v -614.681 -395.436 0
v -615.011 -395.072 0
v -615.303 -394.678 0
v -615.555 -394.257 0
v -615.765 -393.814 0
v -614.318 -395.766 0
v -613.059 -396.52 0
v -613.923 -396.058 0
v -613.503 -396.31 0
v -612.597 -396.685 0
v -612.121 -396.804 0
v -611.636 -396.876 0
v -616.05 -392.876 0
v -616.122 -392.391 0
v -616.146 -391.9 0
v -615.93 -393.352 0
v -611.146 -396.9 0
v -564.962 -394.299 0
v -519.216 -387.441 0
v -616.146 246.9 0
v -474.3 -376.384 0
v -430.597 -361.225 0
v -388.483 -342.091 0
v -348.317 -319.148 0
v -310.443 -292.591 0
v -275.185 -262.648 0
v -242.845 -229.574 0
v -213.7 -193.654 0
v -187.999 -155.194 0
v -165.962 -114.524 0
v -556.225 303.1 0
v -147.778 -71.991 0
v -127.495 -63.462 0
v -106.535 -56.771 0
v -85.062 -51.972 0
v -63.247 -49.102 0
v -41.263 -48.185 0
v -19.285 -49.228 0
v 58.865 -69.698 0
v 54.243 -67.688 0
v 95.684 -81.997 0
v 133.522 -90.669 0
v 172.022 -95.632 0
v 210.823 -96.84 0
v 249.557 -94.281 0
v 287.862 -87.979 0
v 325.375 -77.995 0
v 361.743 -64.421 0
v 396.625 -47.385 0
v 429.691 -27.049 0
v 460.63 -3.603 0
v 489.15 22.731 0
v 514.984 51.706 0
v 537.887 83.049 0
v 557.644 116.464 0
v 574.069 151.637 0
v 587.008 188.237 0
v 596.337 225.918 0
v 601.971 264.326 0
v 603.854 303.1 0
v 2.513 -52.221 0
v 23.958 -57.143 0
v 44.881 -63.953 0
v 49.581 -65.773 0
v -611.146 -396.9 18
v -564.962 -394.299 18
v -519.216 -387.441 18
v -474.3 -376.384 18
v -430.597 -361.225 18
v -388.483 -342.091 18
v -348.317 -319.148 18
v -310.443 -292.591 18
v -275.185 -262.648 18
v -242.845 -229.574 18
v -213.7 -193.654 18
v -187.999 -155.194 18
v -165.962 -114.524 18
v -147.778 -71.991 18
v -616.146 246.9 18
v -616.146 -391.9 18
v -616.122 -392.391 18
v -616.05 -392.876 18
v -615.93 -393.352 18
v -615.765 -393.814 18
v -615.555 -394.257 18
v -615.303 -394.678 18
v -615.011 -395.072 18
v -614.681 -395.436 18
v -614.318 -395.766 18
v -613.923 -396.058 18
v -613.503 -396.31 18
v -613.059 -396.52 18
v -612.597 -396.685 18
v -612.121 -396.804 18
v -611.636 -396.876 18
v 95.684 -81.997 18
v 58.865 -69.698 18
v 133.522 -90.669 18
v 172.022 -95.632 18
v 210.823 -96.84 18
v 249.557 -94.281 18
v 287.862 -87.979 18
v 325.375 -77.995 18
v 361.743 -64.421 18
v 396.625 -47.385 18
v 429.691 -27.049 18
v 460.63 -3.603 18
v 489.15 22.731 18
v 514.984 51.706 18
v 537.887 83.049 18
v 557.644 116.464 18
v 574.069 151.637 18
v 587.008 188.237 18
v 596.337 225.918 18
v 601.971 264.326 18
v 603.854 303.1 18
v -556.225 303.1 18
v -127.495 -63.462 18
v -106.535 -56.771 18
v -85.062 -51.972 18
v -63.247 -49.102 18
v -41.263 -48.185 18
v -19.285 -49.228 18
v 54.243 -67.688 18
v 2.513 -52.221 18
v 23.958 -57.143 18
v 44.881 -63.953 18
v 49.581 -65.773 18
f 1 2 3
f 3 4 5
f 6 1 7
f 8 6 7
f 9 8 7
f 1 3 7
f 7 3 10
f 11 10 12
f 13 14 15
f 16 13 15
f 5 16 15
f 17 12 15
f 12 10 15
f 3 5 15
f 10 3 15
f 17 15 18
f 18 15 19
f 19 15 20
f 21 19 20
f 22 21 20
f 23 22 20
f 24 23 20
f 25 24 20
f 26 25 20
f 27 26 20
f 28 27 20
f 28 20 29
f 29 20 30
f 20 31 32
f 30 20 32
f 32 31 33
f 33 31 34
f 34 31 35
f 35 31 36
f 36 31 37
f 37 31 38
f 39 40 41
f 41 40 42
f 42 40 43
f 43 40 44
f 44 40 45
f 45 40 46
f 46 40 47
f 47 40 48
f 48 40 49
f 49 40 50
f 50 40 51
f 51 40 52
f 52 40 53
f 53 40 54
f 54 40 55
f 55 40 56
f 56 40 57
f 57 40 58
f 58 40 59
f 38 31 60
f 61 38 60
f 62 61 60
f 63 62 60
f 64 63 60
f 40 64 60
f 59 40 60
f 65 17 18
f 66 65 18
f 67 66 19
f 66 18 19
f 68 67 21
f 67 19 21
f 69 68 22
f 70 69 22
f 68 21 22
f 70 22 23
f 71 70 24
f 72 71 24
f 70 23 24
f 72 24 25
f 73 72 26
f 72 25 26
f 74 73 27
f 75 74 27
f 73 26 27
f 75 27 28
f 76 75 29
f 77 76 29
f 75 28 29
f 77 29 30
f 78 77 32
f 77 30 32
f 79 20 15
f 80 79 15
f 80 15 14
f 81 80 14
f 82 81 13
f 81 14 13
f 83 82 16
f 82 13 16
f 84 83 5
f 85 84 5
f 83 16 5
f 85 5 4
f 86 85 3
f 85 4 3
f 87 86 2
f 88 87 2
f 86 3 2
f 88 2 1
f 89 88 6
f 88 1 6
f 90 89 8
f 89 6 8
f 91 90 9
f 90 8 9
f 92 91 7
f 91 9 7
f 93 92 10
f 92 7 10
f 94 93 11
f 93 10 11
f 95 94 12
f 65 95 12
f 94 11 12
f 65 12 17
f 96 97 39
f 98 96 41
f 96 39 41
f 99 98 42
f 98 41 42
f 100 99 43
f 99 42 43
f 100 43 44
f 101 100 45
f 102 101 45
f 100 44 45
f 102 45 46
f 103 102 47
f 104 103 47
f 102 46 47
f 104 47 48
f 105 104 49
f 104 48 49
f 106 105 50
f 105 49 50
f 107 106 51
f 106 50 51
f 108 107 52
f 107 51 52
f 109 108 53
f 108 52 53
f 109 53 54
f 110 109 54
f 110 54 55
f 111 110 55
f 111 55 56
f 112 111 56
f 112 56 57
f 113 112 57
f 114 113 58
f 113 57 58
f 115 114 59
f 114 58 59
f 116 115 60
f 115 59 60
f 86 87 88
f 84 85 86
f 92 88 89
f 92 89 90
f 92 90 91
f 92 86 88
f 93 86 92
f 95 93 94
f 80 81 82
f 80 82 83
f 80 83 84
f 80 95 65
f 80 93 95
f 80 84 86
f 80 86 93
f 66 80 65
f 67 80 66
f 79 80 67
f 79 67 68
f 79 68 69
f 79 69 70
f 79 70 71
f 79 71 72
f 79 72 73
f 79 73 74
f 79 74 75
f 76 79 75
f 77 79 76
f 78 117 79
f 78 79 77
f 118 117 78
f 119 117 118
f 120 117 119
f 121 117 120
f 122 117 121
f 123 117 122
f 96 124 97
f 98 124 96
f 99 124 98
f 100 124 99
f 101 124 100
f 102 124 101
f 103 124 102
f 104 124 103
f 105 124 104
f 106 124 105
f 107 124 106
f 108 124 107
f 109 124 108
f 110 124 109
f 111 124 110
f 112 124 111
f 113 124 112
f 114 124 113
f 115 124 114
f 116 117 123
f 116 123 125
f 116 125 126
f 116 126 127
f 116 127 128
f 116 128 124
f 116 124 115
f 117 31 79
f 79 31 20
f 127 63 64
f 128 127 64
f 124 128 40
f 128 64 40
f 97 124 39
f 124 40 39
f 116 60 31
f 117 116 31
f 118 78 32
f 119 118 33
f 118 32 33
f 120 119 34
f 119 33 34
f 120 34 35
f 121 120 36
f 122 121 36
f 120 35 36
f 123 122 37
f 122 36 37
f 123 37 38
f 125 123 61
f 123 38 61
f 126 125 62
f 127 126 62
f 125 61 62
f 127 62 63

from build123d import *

# Parameters (mm, degrees)
F1_DEPTH = 18


with BuildPart() as f1:
    # F0 (on Top) → F1 (new body)
    with BuildSketch(Plane.XY):
        with BuildLine():
            Line((-196.1456458643, 303.0995183934), (-556.2254190445, 303.0995183934))
            Line((-556.2254190445, 303.0995183934), (-616.1456458643, 246.8996196985))
            Line((-616.1456458643, 246.8996196985), (-616.1456458643, -391.9004816066))
            ThreePointArc((-616.1456458643, -391.9004816066), (-614.6811797702, -395.4360155125), (-611.1456458643, -396.9004816066))
            ThreePointArc((-611.1456458643, -396.9004816066), (-329.0727216352, -306.3075359847), (-147.7778268918, -71.9907044945))
            ThreePointArc((-147.7778268918, -71.9907044945), (-127.8465344688, -4.5525963575), (-117.573135126, 65.0147243663))
            ThreePointArc((-117.573135126, 65.0147243663), (-175.9949552652, 177.7420210203), (-196.1456458643, 303.0995183934))
        make_face()
        with BuildLine():
            Line((-157.8607999442, 303.0995183934), (-196.1456458643, 303.0995183934))
            ThreePointArc((-196.1456458643, 303.0995183934), (-175.9949552652, 177.7420210203), (-117.573135126, 65.0147243663))
            ThreePointArc((-117.573135126, 65.0147243663), (-116.4839005954, 84.0432775566), (-116.1206464893, 103.0995183934))
            ThreePointArc((-116.1206464893, 103.0995183934), (-126.6669028147, 205.2541076325), (-157.8607999442, 303.0995183934))
        make_face()
        with BuildLine():
            ThreePointArc((44.8805112638, -63.9526812765), (-44.8513110762, -10.1822909915), (-117.573135126, 65.0147243663))
            ThreePointArc((-117.573135126, 65.0147243663), (-127.8465344688, -4.5525963575), (-147.7778268918, -71.9907044945))
            ThreePointArc((-147.7778268918, -71.9907044945), (-52.2652669364, -48.3989008983), (44.8805112638, -63.9526812765))
        make_face()
        with BuildLine():
            Line((603.8543541357, 303.0995183934), (-157.8607999442, 303.0995183934))
            ThreePointArc((-157.8607999442, 303.0995183934), (-126.6669028147, 205.2541076325), (-116.1206464893, 103.0995183934))
            ThreePointArc((-116.1206464893, 103.0995183934), (-116.4839005954, 84.0432775566), (-117.573135126, 65.0147243663))
            ThreePointArc((-117.573135126, 65.0147243663), (-44.8513110762, -10.1822909915), (44.8805112638, -63.9526812765))
            ThreePointArc((44.8805112638, -63.9526812765), (51.9164884797, -66.7183226393), (58.8645484837, -69.6979551187))
            ThreePointArc((58.8645484837, -69.6979551187), (429.6906640365, -27.0488741975), (603.8543541357, 303.0995183934))
        make_face()
    extrude(amount=F1_DEPTH)


solid = f1.part
